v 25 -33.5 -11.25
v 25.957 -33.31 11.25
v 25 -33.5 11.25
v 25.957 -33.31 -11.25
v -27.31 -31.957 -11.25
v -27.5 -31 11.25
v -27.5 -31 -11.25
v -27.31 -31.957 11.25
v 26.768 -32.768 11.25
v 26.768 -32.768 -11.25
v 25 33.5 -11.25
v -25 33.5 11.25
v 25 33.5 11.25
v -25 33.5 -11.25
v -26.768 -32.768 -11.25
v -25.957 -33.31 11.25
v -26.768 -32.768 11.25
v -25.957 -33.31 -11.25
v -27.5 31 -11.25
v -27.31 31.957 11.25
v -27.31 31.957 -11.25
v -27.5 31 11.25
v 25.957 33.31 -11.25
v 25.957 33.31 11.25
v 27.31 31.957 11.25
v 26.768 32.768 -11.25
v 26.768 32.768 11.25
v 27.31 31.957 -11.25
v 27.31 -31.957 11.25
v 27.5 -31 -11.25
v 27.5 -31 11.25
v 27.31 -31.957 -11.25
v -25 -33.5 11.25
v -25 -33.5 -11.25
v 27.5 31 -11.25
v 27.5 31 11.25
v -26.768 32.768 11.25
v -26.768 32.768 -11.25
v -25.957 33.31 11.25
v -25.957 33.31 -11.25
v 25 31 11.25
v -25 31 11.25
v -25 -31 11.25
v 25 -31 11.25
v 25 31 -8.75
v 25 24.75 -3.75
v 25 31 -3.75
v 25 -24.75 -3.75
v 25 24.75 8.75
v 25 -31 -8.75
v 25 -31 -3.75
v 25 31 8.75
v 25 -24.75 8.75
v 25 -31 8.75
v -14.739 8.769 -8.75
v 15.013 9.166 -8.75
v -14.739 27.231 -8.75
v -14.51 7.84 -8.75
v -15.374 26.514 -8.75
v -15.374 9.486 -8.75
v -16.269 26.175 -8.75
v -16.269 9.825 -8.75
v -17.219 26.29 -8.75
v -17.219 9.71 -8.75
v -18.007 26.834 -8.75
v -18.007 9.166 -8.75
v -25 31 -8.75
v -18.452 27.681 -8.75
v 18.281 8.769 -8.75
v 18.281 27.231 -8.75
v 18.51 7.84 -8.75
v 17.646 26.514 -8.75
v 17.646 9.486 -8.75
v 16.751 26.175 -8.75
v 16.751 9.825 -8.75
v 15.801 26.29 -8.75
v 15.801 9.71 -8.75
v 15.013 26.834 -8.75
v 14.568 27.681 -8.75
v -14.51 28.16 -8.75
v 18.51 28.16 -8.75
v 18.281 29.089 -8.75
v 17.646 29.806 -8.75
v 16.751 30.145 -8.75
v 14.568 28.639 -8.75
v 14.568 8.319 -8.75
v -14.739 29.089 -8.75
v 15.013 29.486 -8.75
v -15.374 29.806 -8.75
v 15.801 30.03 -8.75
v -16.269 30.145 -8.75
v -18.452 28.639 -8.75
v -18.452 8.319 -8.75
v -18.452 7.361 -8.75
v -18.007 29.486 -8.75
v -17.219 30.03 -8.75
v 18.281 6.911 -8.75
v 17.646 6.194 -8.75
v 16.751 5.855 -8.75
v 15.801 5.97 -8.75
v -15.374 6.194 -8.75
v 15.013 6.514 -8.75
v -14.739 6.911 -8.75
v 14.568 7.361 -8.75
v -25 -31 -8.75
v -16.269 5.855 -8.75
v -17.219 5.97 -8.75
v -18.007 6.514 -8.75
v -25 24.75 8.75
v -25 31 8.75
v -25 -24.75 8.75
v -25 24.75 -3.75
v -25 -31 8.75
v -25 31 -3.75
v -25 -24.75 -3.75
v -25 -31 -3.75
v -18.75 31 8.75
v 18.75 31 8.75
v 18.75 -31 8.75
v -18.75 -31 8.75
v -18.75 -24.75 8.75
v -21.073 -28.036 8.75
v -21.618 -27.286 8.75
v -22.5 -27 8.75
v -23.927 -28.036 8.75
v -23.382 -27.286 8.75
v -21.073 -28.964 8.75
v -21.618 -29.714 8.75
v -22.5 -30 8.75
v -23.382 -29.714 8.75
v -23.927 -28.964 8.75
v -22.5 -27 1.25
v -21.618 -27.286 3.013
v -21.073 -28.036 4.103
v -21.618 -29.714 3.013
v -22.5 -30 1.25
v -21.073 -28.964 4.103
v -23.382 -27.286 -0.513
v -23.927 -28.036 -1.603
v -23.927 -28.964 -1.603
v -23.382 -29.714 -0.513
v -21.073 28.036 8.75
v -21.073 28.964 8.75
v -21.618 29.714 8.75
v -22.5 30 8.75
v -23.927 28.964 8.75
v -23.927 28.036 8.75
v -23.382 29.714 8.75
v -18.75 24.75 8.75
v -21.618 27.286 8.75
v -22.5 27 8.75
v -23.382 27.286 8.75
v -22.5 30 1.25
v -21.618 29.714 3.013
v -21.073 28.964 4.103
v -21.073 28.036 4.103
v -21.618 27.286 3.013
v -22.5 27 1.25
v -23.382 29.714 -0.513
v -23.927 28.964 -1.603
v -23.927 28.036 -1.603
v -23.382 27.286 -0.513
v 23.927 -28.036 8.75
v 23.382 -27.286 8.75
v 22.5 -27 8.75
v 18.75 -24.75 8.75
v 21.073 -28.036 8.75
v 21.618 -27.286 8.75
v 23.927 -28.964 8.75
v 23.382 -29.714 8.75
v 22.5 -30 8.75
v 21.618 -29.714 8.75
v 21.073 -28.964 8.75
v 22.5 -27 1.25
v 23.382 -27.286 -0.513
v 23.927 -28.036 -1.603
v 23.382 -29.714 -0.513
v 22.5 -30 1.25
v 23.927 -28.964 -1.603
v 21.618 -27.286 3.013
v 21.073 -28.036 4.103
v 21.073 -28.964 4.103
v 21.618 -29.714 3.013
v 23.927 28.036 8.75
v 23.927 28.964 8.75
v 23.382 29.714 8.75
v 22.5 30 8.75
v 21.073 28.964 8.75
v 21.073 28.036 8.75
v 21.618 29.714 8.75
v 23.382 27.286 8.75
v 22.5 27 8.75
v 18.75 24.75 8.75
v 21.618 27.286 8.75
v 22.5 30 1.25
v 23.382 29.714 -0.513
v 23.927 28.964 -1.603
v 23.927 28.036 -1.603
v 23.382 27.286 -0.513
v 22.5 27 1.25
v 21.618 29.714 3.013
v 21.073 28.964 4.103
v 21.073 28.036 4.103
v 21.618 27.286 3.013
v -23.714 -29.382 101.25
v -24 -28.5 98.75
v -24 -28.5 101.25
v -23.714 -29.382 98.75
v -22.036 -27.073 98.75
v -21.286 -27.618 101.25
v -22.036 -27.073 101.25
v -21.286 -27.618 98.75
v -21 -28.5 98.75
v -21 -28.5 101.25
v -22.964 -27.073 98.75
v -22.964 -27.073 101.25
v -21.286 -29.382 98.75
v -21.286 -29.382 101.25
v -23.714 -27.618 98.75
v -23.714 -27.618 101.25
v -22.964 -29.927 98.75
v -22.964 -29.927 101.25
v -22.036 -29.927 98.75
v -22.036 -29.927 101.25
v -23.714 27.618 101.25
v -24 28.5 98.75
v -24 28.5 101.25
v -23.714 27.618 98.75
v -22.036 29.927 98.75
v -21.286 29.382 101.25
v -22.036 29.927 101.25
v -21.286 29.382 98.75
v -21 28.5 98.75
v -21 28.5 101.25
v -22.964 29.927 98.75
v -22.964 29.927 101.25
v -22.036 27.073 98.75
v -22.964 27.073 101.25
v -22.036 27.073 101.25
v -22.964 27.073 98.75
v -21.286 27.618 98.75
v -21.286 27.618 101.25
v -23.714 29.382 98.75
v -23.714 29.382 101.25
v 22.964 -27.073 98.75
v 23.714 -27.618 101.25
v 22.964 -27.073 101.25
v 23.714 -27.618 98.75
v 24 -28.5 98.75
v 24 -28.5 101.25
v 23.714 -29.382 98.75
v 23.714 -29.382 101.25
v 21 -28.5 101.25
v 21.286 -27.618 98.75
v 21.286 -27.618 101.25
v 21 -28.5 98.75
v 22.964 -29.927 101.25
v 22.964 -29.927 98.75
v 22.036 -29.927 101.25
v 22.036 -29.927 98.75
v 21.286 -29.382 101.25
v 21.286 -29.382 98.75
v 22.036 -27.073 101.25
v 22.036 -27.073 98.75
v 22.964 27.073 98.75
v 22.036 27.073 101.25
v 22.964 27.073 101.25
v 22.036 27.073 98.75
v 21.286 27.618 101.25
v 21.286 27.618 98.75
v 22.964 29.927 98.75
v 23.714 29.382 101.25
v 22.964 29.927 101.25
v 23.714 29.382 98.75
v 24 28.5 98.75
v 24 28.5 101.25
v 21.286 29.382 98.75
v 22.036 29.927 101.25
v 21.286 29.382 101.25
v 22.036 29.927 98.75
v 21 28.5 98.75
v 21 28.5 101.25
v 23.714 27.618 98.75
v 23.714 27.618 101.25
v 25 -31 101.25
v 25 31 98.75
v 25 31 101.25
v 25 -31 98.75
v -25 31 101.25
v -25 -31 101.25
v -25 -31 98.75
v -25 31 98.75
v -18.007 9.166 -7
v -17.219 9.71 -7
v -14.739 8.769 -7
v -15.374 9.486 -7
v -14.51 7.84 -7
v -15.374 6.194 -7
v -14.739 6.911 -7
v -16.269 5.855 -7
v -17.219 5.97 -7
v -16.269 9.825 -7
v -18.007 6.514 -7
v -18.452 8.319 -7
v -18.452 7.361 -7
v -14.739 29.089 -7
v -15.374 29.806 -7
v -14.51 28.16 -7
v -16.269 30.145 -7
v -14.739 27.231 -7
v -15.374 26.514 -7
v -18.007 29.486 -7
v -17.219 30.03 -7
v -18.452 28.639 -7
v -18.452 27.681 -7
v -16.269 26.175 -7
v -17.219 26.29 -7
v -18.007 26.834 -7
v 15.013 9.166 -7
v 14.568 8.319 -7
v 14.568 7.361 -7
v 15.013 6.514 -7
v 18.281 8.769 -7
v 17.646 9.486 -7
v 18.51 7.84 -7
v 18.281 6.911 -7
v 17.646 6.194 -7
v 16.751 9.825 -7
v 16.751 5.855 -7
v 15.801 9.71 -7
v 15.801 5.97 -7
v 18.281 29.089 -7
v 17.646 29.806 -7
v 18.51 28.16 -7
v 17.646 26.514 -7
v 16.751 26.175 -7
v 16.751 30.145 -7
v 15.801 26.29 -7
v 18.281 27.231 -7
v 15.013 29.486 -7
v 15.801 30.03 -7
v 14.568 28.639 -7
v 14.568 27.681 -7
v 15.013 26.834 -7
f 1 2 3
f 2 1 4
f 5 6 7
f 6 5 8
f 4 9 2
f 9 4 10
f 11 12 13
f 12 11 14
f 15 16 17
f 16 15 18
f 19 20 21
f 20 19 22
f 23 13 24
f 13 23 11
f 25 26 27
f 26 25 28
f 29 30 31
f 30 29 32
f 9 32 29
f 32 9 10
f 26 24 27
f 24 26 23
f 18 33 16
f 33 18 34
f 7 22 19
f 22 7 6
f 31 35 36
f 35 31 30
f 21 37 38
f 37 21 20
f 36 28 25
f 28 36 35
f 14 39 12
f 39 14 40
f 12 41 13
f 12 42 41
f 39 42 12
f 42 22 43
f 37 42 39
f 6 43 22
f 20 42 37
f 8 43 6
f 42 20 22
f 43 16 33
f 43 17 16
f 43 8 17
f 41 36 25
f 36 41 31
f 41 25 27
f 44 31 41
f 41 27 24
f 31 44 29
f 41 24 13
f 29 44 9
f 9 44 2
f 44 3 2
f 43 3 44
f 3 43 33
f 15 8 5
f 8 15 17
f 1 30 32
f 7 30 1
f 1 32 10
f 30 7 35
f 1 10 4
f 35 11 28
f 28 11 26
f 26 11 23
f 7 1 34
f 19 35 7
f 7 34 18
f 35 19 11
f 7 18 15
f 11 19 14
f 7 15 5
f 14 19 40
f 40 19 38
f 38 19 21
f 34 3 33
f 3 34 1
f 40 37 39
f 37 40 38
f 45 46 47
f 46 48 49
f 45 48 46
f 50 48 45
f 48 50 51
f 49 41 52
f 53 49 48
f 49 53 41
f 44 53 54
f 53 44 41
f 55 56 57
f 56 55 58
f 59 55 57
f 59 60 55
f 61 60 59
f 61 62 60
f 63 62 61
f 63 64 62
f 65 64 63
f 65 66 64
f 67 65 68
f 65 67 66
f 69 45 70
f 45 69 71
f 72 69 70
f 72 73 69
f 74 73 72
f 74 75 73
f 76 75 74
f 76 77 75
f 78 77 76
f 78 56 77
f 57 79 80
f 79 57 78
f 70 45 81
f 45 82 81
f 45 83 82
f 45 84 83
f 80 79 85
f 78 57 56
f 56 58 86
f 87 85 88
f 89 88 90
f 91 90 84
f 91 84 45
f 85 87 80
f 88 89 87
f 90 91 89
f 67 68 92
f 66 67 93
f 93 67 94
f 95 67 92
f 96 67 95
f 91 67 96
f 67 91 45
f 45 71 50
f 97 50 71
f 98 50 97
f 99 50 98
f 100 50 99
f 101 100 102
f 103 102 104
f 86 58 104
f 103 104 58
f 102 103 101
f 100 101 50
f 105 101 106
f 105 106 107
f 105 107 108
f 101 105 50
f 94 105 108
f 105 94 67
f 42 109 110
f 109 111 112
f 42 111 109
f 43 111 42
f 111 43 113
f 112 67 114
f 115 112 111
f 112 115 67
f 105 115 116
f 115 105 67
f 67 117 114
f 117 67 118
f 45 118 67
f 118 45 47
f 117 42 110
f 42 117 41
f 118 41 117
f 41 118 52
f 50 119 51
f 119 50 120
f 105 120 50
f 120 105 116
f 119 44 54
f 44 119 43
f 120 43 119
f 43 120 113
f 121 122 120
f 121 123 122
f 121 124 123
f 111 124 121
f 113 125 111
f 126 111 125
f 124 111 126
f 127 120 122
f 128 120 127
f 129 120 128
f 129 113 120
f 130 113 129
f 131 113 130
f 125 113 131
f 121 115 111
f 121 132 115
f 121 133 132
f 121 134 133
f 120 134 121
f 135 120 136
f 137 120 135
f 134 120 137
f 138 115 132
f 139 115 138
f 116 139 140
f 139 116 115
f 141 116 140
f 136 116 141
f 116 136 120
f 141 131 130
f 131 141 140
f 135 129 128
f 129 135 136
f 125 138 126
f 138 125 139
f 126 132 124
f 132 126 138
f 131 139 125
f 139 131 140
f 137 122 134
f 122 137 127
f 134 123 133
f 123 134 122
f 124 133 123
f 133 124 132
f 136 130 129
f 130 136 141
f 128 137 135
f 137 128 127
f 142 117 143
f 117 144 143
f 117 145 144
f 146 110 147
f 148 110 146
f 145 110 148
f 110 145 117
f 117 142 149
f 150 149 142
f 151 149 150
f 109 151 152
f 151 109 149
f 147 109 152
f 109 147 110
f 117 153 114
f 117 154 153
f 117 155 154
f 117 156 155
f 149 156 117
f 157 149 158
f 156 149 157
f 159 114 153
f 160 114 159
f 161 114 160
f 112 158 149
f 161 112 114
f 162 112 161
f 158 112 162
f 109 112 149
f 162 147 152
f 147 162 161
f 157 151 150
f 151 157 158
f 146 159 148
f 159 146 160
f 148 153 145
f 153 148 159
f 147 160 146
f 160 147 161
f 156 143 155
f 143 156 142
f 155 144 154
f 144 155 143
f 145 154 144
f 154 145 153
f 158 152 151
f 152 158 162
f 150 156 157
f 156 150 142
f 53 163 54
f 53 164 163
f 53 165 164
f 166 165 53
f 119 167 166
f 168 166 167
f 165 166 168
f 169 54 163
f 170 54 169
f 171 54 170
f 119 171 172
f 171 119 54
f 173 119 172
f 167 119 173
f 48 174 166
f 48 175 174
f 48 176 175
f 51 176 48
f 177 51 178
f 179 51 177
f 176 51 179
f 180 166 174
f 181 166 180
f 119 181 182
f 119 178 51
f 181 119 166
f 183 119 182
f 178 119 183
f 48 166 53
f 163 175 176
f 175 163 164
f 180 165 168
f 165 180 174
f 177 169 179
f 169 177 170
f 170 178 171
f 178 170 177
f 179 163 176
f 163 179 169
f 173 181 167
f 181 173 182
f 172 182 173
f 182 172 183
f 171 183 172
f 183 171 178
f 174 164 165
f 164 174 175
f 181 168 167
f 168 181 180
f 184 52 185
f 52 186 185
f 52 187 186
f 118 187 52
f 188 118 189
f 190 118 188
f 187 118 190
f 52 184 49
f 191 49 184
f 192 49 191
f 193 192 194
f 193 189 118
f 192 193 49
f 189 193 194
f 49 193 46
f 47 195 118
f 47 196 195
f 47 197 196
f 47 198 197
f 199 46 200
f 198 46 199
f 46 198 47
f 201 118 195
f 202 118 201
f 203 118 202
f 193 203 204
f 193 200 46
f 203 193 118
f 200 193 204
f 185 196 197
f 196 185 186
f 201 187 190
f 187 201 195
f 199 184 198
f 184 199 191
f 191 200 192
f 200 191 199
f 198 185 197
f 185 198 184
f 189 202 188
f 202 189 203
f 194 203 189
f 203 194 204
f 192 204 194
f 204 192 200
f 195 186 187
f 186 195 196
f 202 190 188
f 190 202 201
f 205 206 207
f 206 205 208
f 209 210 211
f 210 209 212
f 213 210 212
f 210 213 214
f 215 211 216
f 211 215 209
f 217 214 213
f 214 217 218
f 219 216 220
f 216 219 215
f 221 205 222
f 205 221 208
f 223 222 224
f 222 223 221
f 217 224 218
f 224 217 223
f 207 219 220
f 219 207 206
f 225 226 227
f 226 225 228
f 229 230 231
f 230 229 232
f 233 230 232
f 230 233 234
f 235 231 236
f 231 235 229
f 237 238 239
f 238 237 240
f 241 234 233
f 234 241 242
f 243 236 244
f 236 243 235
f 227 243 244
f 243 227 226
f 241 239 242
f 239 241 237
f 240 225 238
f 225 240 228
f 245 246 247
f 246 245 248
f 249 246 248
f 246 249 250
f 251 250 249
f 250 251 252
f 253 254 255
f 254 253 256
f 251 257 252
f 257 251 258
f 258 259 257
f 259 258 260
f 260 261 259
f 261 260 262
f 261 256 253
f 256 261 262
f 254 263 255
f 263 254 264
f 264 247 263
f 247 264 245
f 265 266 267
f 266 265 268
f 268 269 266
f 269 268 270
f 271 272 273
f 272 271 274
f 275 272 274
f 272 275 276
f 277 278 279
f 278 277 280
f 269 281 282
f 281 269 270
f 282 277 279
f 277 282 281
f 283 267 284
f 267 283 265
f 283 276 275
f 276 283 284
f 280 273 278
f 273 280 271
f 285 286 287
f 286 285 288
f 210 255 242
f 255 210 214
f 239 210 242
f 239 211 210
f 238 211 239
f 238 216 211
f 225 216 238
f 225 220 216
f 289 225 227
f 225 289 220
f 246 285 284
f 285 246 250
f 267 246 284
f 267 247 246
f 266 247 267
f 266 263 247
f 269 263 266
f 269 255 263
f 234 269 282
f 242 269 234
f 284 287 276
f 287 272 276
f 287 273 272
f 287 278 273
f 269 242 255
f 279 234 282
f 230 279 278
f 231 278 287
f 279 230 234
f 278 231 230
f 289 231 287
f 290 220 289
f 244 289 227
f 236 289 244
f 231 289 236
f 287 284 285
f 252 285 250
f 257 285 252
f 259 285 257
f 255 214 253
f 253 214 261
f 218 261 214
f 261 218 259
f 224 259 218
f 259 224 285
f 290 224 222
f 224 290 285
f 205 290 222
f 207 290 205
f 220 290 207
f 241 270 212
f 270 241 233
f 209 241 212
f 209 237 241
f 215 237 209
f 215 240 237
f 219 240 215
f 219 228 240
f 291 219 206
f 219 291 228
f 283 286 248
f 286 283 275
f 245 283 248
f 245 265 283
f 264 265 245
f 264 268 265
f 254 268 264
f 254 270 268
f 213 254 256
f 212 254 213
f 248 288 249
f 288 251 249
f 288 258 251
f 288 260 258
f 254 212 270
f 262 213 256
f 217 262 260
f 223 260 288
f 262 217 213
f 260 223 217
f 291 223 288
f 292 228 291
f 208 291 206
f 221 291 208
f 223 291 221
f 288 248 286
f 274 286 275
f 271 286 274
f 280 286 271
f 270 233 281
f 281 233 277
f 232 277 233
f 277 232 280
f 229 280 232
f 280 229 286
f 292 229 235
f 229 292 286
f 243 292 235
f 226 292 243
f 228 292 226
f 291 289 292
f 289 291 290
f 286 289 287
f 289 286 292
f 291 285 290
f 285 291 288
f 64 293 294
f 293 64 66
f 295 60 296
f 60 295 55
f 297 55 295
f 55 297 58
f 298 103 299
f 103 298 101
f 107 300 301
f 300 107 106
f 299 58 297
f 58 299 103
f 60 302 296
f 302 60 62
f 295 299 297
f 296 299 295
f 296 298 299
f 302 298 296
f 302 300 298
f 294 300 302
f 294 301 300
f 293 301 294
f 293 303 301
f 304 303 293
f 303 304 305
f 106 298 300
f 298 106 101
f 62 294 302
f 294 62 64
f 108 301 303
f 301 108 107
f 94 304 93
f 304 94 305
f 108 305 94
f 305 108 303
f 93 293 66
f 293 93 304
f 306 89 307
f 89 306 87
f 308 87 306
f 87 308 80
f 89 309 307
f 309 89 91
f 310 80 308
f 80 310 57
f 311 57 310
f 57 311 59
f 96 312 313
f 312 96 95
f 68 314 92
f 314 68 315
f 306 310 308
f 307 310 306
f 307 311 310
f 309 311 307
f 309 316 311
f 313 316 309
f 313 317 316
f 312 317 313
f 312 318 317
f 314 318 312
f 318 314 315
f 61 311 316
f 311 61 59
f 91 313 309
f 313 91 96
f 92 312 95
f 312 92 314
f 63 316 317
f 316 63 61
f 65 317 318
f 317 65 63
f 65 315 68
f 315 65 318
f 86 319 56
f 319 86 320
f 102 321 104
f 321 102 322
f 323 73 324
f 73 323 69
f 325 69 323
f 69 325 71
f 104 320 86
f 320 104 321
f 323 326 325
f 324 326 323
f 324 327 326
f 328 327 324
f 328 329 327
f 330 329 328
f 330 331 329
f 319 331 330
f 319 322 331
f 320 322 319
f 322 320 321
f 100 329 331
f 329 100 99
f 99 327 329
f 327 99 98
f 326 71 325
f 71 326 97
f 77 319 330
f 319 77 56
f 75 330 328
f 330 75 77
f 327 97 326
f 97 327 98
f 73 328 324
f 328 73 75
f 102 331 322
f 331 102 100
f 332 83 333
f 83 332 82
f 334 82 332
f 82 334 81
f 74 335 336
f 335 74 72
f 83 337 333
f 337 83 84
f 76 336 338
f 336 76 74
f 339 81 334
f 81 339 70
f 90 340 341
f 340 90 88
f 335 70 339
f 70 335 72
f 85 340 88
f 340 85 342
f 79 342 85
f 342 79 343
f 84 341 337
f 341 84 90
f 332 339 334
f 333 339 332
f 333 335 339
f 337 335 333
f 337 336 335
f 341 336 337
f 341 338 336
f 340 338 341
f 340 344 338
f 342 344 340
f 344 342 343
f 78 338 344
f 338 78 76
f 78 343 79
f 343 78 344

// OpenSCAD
$fs = 1;
$fa = 1;

wall = 2.5;

module Prism(l, w, h){
    rotate([90,0,0])
        translate([-l/2, -w/2, -h/2])
            polyhedron(
               points=[[0,0,0], [l,0,0], [l,w,0], [0,w,0], [0,w,h], [l,w,h]],
               faces=[[0,1,2,3],[5,4,3,2],[0,4,5,1],[0,3,4],[5,2,1]]
               );
}

module Case(interior_x, interior_y, interior_height) {
    difference() {
        hull() {
            for(x=[-1,1], y=[-1,1])
                translate([interior_x/2*x, interior_y/2*y, 0]) 
                    cylinder(h=interior_height+wall, r=wall, center=true);
        }
        translate([0,0,wall])
            cube([interior_x, interior_y, interior_height+wall], center=true);
    }
    for(x=[-1,1], y=[-1,1])
        translate([interior_x/2*x-wall*x, interior_y/2*y-wall*y, wall/2]) 
            rotate([0,0,-90*x]) 
                difference() {
                    Prism(wall*3, wall*6, wall*3);
                    cylinder(h=interior_height, r=1.5, center=true);
                }
}

module Lid(interior_x, interior_y) {
    difference() {
        cube([interior_x, interior_y, wall], center=true);
        for(x=[-1,1], y=[-1,1])
            translate([interior_x/2*x-wall*x, interior_y/2*y-wall*y, 0]) 
                cylinder(h=wall*2, r=1.5, center=true);
    }
}

module HuzzahMounts() {
    dupont = 2.54;
    long_side = 38.1;
    short_side = 25.4;
    for(x=[-1,1], y=[-1,1])
        translate([long_side*x/2-dupont*x, short_side*y/2-dupont*y, 0]) 
            cylinder(h=3, r=2, center=true);
}

// The box
Case(50, 62, 20);
translate([0,0,100])
    Lid(50, 62);


// The mounts
translate([0,36/2,-11+wall]) 
    HuzzahMounts();
